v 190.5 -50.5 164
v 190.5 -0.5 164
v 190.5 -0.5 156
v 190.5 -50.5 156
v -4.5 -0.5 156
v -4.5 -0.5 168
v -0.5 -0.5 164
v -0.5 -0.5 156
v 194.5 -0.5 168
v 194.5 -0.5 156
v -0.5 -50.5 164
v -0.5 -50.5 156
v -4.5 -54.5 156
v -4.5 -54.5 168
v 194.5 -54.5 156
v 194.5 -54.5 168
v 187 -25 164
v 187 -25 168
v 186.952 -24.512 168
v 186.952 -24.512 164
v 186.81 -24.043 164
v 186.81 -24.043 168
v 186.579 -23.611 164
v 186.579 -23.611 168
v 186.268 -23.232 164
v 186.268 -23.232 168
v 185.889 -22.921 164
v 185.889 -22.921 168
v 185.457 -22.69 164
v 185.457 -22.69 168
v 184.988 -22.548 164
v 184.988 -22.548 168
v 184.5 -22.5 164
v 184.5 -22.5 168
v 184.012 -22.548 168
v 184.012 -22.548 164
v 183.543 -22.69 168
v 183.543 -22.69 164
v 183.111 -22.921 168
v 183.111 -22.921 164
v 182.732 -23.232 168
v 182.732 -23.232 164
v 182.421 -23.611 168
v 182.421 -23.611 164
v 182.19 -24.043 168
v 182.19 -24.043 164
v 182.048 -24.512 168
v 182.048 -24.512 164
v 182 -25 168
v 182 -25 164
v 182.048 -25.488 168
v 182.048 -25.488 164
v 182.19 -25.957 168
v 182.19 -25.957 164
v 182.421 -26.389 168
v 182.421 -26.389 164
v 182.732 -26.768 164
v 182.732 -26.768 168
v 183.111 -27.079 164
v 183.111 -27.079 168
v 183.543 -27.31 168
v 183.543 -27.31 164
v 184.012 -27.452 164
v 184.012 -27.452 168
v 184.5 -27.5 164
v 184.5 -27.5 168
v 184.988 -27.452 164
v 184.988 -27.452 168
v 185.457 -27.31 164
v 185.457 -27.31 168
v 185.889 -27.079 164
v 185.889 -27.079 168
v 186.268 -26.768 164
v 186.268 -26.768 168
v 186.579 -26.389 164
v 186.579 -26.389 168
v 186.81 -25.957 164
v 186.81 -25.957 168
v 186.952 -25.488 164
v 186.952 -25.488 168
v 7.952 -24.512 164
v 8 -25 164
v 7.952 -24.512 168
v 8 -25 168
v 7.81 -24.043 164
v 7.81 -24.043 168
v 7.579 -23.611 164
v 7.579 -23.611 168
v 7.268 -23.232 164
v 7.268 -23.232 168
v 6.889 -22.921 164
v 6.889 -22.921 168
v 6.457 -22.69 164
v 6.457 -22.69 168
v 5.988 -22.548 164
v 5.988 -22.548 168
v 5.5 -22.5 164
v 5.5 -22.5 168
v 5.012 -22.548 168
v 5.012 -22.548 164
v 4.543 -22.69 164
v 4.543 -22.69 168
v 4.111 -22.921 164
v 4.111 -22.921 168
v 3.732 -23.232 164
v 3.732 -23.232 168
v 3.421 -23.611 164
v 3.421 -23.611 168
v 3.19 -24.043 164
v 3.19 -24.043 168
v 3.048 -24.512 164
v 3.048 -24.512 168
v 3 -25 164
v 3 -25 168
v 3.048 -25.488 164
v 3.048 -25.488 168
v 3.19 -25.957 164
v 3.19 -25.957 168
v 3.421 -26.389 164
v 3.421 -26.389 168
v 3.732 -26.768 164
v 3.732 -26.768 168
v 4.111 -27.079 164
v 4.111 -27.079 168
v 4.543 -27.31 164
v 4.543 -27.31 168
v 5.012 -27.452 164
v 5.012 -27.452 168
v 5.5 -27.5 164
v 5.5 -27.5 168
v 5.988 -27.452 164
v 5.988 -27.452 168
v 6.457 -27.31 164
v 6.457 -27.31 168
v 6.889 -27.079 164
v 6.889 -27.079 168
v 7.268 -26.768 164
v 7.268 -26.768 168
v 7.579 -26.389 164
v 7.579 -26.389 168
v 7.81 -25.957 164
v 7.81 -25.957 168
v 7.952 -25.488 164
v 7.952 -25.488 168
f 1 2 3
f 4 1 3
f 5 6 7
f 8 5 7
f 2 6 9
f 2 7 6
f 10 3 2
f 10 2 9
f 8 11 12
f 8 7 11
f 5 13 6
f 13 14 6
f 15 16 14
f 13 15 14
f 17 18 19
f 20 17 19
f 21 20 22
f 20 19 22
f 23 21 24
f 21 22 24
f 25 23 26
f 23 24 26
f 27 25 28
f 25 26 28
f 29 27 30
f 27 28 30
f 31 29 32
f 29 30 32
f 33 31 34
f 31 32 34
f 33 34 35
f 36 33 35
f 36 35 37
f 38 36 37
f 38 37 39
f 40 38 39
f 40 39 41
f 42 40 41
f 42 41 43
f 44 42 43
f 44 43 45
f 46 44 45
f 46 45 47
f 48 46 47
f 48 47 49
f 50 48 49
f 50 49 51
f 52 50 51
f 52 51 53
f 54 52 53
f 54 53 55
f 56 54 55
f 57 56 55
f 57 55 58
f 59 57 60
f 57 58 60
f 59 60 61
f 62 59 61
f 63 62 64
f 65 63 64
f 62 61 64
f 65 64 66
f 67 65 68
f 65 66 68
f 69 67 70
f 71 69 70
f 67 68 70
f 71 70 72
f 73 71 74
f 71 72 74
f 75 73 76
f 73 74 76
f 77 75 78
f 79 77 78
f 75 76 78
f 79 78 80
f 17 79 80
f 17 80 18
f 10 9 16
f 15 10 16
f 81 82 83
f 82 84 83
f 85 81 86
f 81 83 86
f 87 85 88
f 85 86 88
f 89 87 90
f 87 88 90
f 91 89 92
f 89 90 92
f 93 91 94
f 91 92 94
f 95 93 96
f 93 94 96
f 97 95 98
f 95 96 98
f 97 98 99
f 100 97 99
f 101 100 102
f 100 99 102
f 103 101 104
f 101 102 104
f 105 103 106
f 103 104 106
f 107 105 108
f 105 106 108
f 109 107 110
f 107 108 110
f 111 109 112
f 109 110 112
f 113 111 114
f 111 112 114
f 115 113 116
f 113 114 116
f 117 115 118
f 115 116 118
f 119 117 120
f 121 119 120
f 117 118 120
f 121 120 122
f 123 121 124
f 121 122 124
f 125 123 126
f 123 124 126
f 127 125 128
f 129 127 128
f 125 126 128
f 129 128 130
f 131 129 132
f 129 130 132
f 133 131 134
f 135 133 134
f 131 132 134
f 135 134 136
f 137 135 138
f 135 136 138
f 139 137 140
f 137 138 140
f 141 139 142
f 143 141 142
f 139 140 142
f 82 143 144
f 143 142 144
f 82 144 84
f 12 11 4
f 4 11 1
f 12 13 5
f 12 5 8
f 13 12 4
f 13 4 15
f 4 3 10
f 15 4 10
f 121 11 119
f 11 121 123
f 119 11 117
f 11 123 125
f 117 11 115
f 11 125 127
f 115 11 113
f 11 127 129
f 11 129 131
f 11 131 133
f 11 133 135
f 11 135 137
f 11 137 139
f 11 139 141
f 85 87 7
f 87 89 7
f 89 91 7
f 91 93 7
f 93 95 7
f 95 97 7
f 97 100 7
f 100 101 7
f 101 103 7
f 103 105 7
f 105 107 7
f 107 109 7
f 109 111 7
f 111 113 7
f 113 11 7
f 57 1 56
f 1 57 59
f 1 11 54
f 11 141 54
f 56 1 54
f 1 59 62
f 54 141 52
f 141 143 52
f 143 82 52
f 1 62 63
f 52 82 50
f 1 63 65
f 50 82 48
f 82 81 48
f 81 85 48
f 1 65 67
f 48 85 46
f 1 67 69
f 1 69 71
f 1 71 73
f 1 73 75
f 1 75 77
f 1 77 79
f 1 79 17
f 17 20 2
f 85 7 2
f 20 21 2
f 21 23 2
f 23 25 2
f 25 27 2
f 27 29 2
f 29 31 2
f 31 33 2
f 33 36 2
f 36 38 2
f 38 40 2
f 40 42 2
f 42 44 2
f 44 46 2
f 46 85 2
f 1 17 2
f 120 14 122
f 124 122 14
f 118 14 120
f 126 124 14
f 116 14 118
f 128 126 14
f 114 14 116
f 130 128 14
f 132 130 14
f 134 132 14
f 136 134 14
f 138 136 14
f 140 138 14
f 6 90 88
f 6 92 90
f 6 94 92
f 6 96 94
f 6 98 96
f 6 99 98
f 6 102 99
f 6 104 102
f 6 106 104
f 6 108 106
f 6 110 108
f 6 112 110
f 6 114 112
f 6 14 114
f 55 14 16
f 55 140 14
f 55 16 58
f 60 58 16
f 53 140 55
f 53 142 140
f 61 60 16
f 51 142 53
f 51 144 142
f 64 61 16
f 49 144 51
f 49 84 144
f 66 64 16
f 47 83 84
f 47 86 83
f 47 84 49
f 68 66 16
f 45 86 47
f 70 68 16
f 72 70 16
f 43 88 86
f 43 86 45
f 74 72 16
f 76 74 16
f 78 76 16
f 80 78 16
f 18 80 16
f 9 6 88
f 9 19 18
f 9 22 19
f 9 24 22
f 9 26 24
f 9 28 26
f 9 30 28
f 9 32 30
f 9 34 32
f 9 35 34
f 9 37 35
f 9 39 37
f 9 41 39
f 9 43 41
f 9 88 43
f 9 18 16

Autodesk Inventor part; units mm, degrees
ref_plane "YZ Plane" through (0, 0, 0) normal (1, 0, 0) x (0, 1, 0)
ref_plane "XZ Plane" through (0, 0, 0) normal (0, 1, 0) x (-1, 0, 0)
ref_plane "Pracovní rovina11" through (0, 0, 164) normal (0, 0, 1) x (1, 0, 0)
sketch "Náčrt11" plane through (0, 0, 164) normal (0, 0, 1) x (1, 0, 0)
  line L0 (-0.5, -50.5) -> (190.5, -50.5)
  line L1 (190.5, -50.5) -> (190.5, 0.5)
  line L2 (190.5, 0.5) -> (-0.5, 0.5)
  line L3 (-0.5, 0.5) -> (-0.5, -50.5)
  line L4 (0, 0) -> (0, -50) projected
  line L5 (190, -50) -> (190, 0) projected
  line L6 (190, 0) -> (0, 0) projected
  line L7 (182, -50) -> (58, -50) projected
  line L8 (-4.5, 4.5) -> (194.5, 4.5)
  line L9 (194.5, 4.5) -> (194.5, -54.5)
  line L10 (194.5, -54.5) -> (-4.5, -54.5)
  line L11 (-4.5, -54.5) -> (-4.5, 4.5)
  dimension "d43" = 0.5
  dimension "d44" = 0.5
  dimension "d45" = 0.5
  dimension "d46" = 0.5
  dimension "d47" = 4
extrude "Vysunutí11" add sketch "Náčrt11" against normal blind 8
sketch "Náčrt12" plane through (0, 0, 164) normal (0, 0, 1) x (1, 0, 0)
  line L0 (-4.5, 4.5) -> (-4.5, -54.5) projected
  line L1 (194.5, 4.5) -> (-4.5, 4.5) projected
  line L2 (194.5, -54.5) -> (194.5, 4.5) projected
  line L3 (-4.5, -54.5) -> (194.5, -54.5) projected
  point P0 (0, 0)
extrude "Vysunutí12" add sketch "Náčrt12" along normal blind 4
sketch "Náčrt13" plane through (0, 0, 168) normal (0, 0, 1) x (1, 0, 0)
  circle A0 centre (5.5, -25) radius 2.5
  circle A1 centre (184.5, -25) radius 2.5
  line L0 (-4.5, -54.5) -> (194.5, -54.5) projected
  line L1 (194.5, 4.5) -> (-4.5, 4.5) projected
  line L2 (-4.5, 4.5) -> (-4.5, -54.5) projected
  line L3 (194.5, -54.5) -> (194.5, 4.5) projected
  point P0 (0, 0)
  dimension "d52" = 5
  dimension "d53" = 5
  dimension "d54" = 59
  dimension "d55" = 29.5
  dimension "d56" = 29.5
  dimension "d57" = 10
  dimension "d58" = 10
extrude "Vysunutí13" cut sketch "Náčrt13" against normal through all contours A0 | A1
sketch "Náčrt14" plane through (-4.5, 4.5, 156) normal (0, 1, 0) x (1, 0, 0)
  line L0 (4, -8) -> (4, 0) projected
  line L1 (195, -8) -> (195, 0) projected
  line L2 (4, -8) -> (195, -8) projected
  line L3 (0, 0) -> (199, 0) projected
  point P0 (4.5, 156)
extrude "Vysunutí14" cut sketch "Náčrt14" against normal up to surface (4 mm away)
sketch "Náčrt15" plane through (-4.5, 4.5, 168) normal (0, 1, 0) x (1, 0, 0)
  line L0 (199, 0) -> (0, 0) projected
  line L1 (199, 12) -> (199, 0) projected
  line L2 (195, 12) -> (195, 4) projected
  line L3 (195, 4) -> (4, 4) projected
  line L4 (4, 4) -> (4, 12) projected
  line L5 (0, 12) -> (0, 0) projected
  line L6 (0, 12) -> (4, 12) projected
  line L7 (195, 12) -> (199, 12) projected
  point P0 (4.5, 168)
extrude "Vysunutí15" cut sketch "Náčrt15" against normal blind 5
properties part number "krab1-ver1" material "11 500"
